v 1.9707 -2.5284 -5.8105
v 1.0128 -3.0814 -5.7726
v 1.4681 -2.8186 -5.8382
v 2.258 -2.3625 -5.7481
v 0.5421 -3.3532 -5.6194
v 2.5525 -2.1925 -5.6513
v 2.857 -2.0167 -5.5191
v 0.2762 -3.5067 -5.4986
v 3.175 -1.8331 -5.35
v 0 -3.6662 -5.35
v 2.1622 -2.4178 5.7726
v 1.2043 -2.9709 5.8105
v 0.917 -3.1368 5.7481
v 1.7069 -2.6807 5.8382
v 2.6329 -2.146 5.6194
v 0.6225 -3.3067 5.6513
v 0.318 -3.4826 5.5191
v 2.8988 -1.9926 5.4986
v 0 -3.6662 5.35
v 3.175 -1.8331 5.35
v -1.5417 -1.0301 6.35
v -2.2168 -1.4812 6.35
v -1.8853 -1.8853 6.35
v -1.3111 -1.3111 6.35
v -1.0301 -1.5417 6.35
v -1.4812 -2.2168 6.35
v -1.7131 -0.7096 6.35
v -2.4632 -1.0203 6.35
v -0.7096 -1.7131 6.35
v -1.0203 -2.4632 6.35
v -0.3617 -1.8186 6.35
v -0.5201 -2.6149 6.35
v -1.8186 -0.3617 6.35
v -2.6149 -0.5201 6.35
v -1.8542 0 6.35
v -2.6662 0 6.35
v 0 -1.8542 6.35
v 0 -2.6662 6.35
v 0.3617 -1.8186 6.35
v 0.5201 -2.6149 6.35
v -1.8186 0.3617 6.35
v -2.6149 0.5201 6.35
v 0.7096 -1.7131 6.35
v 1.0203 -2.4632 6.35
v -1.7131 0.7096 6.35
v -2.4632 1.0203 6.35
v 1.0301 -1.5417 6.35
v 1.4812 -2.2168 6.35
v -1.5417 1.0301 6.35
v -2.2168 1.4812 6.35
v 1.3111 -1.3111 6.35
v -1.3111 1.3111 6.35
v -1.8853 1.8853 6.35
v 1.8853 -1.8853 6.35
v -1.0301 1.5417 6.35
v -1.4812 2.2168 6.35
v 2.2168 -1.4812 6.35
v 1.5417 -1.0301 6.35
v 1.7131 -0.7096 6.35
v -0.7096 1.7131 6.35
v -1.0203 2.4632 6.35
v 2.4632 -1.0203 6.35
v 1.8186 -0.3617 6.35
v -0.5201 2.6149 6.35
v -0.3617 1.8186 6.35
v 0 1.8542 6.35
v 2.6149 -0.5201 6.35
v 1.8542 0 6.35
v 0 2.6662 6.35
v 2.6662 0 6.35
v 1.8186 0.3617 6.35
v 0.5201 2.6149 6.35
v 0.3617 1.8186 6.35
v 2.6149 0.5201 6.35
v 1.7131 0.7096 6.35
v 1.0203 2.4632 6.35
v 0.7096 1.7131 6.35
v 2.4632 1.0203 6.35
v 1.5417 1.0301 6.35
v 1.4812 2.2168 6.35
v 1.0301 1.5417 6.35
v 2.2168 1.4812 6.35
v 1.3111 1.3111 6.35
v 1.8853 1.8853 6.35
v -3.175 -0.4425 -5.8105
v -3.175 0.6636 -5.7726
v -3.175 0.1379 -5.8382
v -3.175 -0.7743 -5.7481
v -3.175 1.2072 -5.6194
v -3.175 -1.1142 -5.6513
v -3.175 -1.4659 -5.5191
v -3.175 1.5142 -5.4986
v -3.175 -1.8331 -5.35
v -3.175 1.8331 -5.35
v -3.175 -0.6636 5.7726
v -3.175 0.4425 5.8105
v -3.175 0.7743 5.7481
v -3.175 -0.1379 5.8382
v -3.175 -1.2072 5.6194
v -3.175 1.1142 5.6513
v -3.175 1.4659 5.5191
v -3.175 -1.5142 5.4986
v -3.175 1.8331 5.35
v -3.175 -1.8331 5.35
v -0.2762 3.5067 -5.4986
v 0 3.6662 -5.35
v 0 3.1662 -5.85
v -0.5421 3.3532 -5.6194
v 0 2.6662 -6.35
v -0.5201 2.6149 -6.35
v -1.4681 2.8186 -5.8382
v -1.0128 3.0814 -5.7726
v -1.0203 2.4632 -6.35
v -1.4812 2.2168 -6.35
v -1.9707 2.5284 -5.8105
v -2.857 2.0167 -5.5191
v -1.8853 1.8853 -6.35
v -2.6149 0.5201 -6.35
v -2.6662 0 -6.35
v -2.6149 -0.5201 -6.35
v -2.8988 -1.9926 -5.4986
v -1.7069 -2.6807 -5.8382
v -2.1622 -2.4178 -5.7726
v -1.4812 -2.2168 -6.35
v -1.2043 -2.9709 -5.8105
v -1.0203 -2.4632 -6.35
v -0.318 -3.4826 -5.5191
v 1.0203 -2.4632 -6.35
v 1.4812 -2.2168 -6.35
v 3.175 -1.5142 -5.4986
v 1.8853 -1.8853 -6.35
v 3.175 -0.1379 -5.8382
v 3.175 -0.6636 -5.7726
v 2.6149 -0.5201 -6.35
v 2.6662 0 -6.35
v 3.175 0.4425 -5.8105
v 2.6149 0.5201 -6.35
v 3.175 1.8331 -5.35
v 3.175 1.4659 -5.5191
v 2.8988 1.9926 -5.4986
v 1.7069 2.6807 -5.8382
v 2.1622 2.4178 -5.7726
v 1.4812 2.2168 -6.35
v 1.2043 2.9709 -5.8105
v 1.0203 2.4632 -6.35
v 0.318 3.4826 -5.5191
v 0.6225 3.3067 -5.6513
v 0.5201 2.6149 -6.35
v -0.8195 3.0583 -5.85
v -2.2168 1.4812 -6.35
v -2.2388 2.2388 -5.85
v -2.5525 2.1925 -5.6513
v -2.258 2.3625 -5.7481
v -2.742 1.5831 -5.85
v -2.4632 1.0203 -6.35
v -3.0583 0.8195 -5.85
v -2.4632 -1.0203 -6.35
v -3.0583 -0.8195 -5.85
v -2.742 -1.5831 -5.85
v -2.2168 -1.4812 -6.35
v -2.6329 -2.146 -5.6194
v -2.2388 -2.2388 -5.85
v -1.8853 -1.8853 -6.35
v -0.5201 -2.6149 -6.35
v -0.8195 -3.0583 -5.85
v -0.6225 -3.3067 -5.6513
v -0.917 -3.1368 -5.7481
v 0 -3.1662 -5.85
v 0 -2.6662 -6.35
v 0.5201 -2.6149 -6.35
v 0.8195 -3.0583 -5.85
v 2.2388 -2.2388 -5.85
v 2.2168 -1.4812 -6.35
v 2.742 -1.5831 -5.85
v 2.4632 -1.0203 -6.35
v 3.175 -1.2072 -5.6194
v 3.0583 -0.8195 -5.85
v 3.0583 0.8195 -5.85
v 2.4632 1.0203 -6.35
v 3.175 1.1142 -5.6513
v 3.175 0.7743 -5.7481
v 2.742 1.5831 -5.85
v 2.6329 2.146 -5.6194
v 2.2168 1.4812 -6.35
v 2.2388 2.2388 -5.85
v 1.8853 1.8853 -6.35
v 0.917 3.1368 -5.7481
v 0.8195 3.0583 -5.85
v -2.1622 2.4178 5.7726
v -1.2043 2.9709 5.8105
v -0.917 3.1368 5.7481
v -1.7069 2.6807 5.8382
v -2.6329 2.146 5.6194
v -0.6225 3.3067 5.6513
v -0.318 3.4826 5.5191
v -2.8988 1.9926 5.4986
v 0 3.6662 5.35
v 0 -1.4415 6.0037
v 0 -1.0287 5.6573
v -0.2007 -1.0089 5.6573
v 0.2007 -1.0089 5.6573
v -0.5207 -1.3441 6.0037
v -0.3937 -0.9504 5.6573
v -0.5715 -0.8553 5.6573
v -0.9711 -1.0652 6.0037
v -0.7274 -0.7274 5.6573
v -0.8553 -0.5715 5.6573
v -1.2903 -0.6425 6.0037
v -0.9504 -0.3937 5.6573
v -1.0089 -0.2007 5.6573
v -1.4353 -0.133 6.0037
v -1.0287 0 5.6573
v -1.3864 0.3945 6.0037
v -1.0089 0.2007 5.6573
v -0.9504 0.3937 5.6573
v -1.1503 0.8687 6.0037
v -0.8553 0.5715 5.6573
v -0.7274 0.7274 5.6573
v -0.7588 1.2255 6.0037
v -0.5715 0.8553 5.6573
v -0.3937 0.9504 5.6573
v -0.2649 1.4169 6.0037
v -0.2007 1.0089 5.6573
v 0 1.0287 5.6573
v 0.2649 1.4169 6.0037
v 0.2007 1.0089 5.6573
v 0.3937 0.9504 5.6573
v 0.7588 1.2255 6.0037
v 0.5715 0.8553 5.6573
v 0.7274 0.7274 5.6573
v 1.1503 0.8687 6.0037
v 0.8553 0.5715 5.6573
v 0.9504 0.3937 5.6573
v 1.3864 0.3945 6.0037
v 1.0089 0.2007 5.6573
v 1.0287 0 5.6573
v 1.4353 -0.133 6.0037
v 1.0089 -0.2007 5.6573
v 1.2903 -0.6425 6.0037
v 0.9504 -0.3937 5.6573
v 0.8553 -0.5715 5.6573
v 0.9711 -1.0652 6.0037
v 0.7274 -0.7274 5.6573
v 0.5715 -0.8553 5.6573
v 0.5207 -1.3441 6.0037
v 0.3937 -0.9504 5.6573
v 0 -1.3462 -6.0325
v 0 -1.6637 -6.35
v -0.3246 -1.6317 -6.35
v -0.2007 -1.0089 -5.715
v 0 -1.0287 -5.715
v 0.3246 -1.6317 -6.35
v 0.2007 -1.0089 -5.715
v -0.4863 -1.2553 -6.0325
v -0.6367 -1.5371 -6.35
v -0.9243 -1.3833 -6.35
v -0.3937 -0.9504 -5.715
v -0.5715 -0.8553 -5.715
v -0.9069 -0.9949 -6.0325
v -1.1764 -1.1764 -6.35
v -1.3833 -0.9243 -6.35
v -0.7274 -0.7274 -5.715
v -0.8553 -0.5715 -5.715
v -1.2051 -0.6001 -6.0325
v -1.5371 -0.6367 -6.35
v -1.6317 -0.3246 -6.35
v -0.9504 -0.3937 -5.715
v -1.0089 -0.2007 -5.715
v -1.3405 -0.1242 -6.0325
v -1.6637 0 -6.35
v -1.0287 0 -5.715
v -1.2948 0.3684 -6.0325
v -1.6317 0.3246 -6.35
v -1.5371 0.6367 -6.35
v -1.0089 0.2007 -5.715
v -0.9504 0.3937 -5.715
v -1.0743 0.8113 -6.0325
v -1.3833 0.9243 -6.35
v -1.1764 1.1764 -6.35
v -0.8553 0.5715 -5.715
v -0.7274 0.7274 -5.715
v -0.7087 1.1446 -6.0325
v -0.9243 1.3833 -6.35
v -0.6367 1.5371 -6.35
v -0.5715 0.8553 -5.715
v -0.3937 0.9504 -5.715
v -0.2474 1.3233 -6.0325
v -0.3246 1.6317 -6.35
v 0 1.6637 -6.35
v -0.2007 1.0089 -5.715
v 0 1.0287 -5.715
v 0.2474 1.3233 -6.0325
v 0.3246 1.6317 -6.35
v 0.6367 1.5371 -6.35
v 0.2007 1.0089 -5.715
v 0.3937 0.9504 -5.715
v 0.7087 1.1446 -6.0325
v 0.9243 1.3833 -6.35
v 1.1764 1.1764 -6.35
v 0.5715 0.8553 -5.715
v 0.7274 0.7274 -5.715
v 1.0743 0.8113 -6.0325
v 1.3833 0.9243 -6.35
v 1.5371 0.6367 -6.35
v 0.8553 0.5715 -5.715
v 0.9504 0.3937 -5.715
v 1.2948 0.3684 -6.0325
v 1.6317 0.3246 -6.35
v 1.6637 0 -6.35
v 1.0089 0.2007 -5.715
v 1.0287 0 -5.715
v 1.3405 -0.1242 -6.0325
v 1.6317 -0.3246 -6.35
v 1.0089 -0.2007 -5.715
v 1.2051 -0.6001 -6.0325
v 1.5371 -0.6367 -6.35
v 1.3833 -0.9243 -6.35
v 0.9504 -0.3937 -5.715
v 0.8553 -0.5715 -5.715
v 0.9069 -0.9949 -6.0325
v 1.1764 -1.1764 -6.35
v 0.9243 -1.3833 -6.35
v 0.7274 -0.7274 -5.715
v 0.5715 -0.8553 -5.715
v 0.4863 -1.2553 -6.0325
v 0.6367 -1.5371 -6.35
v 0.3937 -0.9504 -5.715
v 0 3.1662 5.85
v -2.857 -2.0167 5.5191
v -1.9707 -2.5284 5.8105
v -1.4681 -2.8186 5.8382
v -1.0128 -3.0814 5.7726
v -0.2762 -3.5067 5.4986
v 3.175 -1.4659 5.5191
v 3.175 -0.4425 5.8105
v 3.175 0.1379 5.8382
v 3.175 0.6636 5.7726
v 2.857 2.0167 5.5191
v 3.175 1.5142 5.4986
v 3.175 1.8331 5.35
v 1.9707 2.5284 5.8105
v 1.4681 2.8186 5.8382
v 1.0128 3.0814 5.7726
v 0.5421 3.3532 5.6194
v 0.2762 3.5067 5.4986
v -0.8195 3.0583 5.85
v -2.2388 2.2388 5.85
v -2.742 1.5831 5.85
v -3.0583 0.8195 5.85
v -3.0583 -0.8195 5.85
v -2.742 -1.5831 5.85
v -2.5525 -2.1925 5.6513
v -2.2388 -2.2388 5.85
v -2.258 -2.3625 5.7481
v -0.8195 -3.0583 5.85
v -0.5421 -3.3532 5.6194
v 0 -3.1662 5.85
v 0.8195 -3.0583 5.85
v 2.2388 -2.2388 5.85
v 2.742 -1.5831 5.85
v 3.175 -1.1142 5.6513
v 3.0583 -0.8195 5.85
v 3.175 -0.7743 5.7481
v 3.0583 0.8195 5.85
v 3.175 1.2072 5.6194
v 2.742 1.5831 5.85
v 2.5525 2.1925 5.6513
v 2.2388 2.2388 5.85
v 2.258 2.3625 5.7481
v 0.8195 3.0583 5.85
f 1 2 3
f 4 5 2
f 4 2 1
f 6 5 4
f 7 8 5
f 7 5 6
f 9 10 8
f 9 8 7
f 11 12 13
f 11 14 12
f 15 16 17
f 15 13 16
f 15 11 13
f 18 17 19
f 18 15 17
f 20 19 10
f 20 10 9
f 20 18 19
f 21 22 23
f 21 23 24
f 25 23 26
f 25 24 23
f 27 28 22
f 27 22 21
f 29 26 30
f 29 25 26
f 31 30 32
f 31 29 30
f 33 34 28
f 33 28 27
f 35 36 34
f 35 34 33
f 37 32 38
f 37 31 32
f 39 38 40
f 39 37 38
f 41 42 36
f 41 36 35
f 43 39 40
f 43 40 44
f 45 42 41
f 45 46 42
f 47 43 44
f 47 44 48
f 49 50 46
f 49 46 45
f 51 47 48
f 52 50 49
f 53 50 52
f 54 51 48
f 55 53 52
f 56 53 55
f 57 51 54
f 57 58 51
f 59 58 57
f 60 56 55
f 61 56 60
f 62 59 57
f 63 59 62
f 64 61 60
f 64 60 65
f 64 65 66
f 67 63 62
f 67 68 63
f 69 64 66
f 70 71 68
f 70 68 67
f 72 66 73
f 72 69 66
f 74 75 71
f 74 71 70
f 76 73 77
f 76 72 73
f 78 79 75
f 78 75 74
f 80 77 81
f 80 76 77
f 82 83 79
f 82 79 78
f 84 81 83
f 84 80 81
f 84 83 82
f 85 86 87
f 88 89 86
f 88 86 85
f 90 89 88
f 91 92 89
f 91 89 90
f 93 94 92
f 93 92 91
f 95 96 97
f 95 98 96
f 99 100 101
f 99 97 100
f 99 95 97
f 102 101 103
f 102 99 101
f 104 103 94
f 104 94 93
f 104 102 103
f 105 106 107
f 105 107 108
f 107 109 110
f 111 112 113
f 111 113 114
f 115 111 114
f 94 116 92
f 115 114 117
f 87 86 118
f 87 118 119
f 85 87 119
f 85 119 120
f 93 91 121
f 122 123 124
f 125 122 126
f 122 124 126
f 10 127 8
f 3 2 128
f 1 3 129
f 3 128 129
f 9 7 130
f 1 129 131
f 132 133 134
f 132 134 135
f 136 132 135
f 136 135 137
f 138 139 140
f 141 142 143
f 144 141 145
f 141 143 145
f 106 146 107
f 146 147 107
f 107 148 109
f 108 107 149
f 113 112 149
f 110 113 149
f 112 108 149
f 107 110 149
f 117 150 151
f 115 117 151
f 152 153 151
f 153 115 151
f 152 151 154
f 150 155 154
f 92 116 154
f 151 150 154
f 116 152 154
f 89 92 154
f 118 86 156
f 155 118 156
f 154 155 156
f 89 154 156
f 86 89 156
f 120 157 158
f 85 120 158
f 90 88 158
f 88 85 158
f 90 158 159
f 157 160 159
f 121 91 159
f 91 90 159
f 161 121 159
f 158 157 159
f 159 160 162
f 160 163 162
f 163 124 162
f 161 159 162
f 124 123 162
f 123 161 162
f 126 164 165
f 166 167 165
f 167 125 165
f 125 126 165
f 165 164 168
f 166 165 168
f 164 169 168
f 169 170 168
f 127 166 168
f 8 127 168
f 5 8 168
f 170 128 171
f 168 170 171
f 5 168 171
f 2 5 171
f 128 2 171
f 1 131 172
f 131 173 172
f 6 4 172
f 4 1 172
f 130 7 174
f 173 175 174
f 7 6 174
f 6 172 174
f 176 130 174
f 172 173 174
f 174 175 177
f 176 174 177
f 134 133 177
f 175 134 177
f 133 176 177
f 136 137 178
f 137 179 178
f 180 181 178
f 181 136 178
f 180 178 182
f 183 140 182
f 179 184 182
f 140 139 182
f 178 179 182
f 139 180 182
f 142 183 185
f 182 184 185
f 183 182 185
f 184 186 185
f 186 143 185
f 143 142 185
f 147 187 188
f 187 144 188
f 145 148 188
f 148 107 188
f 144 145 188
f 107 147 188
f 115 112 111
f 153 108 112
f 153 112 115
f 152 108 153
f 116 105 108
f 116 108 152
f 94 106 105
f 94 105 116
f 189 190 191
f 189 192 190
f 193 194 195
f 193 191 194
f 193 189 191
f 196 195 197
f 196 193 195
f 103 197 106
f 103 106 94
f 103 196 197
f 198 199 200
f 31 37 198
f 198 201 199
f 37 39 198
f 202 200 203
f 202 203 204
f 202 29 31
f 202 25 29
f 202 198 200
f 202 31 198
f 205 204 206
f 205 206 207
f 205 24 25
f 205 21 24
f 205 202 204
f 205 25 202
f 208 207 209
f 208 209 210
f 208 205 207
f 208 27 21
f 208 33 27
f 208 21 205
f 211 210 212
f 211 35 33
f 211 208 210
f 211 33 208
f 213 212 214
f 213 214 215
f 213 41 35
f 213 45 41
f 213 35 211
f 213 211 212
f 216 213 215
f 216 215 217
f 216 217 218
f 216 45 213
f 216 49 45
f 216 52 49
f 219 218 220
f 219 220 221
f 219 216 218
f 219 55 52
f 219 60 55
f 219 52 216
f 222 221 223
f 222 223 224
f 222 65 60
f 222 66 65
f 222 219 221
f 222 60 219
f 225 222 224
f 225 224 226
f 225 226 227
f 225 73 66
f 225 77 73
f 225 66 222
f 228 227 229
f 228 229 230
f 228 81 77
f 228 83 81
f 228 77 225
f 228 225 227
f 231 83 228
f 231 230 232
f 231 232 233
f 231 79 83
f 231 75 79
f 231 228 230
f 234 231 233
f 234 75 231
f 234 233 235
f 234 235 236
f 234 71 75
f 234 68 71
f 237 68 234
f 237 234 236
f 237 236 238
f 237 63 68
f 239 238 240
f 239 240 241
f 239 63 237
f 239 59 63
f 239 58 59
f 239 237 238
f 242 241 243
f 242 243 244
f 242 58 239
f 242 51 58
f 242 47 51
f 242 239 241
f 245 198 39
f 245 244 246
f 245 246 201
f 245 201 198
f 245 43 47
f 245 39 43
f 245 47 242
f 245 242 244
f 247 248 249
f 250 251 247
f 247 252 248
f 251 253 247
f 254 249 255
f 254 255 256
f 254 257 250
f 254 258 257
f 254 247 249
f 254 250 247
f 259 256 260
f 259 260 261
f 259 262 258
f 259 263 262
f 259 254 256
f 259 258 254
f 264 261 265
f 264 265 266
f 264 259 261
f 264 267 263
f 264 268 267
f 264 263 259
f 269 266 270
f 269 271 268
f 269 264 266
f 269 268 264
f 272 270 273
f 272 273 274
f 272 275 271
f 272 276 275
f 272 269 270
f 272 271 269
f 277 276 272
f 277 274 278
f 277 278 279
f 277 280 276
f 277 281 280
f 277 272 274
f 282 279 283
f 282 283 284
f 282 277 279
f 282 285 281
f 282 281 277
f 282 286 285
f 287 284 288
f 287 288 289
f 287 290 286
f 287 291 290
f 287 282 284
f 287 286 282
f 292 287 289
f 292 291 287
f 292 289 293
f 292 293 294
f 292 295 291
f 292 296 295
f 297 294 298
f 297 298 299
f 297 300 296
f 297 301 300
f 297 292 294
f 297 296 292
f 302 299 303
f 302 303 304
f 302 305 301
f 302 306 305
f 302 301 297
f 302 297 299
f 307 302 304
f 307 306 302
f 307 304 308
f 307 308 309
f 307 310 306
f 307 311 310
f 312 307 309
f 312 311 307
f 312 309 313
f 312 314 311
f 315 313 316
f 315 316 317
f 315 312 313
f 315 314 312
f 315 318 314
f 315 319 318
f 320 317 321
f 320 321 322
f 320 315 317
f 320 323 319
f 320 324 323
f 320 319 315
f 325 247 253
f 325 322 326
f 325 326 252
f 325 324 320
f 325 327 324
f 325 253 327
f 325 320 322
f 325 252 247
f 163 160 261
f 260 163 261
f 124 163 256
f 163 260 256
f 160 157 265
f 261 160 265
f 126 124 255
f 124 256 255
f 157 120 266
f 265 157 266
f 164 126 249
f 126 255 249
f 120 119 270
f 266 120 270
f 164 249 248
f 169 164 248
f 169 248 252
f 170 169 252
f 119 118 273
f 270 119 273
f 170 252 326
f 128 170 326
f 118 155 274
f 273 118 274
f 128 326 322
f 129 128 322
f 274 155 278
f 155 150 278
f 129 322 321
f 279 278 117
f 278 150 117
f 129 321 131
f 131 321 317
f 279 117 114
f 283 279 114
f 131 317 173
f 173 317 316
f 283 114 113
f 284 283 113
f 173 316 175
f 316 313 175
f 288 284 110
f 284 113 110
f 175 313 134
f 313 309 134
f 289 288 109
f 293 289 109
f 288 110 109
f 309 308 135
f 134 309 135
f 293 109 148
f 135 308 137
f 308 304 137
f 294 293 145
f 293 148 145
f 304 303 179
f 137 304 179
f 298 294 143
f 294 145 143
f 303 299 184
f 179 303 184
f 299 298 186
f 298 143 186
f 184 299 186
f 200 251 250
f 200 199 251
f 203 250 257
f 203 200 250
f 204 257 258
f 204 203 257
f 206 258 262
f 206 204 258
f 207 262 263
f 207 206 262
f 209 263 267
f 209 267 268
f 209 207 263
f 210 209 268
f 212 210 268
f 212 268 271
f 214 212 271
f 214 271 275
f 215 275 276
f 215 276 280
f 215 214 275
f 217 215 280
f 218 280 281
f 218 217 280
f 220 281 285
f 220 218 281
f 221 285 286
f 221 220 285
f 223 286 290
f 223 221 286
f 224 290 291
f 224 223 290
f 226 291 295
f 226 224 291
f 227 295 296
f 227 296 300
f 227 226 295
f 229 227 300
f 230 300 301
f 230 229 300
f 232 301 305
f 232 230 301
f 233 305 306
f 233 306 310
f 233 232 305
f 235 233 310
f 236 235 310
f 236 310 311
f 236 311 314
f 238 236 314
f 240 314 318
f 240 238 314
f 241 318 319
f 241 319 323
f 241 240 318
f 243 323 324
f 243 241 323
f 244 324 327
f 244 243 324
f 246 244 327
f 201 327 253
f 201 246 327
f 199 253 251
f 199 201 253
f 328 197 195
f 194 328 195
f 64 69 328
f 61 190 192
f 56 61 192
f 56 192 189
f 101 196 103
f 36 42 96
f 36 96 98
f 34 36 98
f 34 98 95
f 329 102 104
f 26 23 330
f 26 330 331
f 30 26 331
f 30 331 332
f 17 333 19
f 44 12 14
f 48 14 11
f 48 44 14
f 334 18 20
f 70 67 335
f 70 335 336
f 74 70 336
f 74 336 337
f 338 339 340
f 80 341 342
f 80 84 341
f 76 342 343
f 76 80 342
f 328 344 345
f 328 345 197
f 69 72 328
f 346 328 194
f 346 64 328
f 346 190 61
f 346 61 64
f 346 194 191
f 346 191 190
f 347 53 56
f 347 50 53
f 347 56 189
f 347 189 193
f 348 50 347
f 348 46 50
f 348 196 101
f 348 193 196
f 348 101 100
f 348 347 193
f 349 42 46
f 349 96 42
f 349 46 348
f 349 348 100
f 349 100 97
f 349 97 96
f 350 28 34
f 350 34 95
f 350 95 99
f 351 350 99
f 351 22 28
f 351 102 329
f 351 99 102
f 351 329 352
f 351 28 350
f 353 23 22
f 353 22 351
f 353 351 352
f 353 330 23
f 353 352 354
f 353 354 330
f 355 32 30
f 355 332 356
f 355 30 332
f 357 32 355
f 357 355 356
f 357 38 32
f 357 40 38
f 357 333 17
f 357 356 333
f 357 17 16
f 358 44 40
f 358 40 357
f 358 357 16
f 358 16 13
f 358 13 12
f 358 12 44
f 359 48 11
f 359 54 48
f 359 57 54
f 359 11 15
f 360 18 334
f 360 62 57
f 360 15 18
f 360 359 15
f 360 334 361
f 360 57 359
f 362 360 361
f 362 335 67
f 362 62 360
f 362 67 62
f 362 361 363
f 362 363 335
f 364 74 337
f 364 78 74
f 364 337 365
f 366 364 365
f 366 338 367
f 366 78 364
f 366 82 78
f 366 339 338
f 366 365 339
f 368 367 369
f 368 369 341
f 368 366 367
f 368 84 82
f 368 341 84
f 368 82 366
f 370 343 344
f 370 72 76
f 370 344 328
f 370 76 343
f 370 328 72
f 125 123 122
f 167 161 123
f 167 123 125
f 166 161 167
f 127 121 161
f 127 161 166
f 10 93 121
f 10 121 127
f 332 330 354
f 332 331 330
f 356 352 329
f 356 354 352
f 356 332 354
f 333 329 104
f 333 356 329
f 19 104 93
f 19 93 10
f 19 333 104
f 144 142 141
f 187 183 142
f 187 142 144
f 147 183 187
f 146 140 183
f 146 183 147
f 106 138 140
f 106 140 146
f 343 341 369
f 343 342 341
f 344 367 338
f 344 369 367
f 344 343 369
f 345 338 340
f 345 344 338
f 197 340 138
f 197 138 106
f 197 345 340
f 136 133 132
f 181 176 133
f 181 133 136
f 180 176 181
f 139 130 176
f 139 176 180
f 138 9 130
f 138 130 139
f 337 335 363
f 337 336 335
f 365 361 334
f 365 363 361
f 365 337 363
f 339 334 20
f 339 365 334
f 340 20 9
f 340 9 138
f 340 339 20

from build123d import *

# Parameters (mm, degrees)
BOSS_EXTRUDE1_DEPTH      = 6.35
BOSS_EXTRUDE1_DEPTH_BACK = 6.35


with BuildPart() as part:
    # Sketch1 → Boss-Extrude1 (new body, two sides)
    with BuildSketch(Plane.XY) as boss_extrude1_sk:
        Polygon((3.175, -1.833087105), (3.175, 1.833087105), (0, 3.666174209), (-3.175, 1.833087105), (-3.175, -1.833087105), (0, -3.666174209), align=None)
    extrude(amount=BOSS_EXTRUDE1_DEPTH)
    extrude(boss_extrude1_sk.sketch, amount=-BOSS_EXTRUDE1_DEPTH_BACK)

    # Sketch3 → Cut-Revolve2 (revolve, cut)
    with BuildSketch(Plane(origin=(0, 0, 0), x_dir=(0, 0, -1), z_dir=(1, 0, 0))):
        Polygon((-5.35, 3.666174209), (-6.35, 2.666174209), (-6.35, 3.666174209), align=None)
    cut_revolve2 = revolve(axis=Axis((0, 0, -0.635), (0, 0, 1)), mode=Mode.SUBTRACT)

    # Mirror1: Cut-Revolve2 across plane
    add(cut_revolve2.mirror(Plane.XY), mode=Mode.SUBTRACT)

    # Sketch4 → CSK for _1 Flat Head Machine Screw _100 (revolve, cut)
    with BuildSketch(Plane(origin=(0, 0, 6.35), x_dir=(0, -1, 0), z_dir=(1, 0, 0))):
        Polygon((0, 0), (0, 12.7), (1.6637, 12.7), (1.0287, 12.065), (1.0287, 0.692676746), (1.8542, 0), align=None)
    revolve(axis=Axis((0, 0, 12.7), (0, 0, -1)), mode=Mode.SUBTRACT)


solid = part.part
